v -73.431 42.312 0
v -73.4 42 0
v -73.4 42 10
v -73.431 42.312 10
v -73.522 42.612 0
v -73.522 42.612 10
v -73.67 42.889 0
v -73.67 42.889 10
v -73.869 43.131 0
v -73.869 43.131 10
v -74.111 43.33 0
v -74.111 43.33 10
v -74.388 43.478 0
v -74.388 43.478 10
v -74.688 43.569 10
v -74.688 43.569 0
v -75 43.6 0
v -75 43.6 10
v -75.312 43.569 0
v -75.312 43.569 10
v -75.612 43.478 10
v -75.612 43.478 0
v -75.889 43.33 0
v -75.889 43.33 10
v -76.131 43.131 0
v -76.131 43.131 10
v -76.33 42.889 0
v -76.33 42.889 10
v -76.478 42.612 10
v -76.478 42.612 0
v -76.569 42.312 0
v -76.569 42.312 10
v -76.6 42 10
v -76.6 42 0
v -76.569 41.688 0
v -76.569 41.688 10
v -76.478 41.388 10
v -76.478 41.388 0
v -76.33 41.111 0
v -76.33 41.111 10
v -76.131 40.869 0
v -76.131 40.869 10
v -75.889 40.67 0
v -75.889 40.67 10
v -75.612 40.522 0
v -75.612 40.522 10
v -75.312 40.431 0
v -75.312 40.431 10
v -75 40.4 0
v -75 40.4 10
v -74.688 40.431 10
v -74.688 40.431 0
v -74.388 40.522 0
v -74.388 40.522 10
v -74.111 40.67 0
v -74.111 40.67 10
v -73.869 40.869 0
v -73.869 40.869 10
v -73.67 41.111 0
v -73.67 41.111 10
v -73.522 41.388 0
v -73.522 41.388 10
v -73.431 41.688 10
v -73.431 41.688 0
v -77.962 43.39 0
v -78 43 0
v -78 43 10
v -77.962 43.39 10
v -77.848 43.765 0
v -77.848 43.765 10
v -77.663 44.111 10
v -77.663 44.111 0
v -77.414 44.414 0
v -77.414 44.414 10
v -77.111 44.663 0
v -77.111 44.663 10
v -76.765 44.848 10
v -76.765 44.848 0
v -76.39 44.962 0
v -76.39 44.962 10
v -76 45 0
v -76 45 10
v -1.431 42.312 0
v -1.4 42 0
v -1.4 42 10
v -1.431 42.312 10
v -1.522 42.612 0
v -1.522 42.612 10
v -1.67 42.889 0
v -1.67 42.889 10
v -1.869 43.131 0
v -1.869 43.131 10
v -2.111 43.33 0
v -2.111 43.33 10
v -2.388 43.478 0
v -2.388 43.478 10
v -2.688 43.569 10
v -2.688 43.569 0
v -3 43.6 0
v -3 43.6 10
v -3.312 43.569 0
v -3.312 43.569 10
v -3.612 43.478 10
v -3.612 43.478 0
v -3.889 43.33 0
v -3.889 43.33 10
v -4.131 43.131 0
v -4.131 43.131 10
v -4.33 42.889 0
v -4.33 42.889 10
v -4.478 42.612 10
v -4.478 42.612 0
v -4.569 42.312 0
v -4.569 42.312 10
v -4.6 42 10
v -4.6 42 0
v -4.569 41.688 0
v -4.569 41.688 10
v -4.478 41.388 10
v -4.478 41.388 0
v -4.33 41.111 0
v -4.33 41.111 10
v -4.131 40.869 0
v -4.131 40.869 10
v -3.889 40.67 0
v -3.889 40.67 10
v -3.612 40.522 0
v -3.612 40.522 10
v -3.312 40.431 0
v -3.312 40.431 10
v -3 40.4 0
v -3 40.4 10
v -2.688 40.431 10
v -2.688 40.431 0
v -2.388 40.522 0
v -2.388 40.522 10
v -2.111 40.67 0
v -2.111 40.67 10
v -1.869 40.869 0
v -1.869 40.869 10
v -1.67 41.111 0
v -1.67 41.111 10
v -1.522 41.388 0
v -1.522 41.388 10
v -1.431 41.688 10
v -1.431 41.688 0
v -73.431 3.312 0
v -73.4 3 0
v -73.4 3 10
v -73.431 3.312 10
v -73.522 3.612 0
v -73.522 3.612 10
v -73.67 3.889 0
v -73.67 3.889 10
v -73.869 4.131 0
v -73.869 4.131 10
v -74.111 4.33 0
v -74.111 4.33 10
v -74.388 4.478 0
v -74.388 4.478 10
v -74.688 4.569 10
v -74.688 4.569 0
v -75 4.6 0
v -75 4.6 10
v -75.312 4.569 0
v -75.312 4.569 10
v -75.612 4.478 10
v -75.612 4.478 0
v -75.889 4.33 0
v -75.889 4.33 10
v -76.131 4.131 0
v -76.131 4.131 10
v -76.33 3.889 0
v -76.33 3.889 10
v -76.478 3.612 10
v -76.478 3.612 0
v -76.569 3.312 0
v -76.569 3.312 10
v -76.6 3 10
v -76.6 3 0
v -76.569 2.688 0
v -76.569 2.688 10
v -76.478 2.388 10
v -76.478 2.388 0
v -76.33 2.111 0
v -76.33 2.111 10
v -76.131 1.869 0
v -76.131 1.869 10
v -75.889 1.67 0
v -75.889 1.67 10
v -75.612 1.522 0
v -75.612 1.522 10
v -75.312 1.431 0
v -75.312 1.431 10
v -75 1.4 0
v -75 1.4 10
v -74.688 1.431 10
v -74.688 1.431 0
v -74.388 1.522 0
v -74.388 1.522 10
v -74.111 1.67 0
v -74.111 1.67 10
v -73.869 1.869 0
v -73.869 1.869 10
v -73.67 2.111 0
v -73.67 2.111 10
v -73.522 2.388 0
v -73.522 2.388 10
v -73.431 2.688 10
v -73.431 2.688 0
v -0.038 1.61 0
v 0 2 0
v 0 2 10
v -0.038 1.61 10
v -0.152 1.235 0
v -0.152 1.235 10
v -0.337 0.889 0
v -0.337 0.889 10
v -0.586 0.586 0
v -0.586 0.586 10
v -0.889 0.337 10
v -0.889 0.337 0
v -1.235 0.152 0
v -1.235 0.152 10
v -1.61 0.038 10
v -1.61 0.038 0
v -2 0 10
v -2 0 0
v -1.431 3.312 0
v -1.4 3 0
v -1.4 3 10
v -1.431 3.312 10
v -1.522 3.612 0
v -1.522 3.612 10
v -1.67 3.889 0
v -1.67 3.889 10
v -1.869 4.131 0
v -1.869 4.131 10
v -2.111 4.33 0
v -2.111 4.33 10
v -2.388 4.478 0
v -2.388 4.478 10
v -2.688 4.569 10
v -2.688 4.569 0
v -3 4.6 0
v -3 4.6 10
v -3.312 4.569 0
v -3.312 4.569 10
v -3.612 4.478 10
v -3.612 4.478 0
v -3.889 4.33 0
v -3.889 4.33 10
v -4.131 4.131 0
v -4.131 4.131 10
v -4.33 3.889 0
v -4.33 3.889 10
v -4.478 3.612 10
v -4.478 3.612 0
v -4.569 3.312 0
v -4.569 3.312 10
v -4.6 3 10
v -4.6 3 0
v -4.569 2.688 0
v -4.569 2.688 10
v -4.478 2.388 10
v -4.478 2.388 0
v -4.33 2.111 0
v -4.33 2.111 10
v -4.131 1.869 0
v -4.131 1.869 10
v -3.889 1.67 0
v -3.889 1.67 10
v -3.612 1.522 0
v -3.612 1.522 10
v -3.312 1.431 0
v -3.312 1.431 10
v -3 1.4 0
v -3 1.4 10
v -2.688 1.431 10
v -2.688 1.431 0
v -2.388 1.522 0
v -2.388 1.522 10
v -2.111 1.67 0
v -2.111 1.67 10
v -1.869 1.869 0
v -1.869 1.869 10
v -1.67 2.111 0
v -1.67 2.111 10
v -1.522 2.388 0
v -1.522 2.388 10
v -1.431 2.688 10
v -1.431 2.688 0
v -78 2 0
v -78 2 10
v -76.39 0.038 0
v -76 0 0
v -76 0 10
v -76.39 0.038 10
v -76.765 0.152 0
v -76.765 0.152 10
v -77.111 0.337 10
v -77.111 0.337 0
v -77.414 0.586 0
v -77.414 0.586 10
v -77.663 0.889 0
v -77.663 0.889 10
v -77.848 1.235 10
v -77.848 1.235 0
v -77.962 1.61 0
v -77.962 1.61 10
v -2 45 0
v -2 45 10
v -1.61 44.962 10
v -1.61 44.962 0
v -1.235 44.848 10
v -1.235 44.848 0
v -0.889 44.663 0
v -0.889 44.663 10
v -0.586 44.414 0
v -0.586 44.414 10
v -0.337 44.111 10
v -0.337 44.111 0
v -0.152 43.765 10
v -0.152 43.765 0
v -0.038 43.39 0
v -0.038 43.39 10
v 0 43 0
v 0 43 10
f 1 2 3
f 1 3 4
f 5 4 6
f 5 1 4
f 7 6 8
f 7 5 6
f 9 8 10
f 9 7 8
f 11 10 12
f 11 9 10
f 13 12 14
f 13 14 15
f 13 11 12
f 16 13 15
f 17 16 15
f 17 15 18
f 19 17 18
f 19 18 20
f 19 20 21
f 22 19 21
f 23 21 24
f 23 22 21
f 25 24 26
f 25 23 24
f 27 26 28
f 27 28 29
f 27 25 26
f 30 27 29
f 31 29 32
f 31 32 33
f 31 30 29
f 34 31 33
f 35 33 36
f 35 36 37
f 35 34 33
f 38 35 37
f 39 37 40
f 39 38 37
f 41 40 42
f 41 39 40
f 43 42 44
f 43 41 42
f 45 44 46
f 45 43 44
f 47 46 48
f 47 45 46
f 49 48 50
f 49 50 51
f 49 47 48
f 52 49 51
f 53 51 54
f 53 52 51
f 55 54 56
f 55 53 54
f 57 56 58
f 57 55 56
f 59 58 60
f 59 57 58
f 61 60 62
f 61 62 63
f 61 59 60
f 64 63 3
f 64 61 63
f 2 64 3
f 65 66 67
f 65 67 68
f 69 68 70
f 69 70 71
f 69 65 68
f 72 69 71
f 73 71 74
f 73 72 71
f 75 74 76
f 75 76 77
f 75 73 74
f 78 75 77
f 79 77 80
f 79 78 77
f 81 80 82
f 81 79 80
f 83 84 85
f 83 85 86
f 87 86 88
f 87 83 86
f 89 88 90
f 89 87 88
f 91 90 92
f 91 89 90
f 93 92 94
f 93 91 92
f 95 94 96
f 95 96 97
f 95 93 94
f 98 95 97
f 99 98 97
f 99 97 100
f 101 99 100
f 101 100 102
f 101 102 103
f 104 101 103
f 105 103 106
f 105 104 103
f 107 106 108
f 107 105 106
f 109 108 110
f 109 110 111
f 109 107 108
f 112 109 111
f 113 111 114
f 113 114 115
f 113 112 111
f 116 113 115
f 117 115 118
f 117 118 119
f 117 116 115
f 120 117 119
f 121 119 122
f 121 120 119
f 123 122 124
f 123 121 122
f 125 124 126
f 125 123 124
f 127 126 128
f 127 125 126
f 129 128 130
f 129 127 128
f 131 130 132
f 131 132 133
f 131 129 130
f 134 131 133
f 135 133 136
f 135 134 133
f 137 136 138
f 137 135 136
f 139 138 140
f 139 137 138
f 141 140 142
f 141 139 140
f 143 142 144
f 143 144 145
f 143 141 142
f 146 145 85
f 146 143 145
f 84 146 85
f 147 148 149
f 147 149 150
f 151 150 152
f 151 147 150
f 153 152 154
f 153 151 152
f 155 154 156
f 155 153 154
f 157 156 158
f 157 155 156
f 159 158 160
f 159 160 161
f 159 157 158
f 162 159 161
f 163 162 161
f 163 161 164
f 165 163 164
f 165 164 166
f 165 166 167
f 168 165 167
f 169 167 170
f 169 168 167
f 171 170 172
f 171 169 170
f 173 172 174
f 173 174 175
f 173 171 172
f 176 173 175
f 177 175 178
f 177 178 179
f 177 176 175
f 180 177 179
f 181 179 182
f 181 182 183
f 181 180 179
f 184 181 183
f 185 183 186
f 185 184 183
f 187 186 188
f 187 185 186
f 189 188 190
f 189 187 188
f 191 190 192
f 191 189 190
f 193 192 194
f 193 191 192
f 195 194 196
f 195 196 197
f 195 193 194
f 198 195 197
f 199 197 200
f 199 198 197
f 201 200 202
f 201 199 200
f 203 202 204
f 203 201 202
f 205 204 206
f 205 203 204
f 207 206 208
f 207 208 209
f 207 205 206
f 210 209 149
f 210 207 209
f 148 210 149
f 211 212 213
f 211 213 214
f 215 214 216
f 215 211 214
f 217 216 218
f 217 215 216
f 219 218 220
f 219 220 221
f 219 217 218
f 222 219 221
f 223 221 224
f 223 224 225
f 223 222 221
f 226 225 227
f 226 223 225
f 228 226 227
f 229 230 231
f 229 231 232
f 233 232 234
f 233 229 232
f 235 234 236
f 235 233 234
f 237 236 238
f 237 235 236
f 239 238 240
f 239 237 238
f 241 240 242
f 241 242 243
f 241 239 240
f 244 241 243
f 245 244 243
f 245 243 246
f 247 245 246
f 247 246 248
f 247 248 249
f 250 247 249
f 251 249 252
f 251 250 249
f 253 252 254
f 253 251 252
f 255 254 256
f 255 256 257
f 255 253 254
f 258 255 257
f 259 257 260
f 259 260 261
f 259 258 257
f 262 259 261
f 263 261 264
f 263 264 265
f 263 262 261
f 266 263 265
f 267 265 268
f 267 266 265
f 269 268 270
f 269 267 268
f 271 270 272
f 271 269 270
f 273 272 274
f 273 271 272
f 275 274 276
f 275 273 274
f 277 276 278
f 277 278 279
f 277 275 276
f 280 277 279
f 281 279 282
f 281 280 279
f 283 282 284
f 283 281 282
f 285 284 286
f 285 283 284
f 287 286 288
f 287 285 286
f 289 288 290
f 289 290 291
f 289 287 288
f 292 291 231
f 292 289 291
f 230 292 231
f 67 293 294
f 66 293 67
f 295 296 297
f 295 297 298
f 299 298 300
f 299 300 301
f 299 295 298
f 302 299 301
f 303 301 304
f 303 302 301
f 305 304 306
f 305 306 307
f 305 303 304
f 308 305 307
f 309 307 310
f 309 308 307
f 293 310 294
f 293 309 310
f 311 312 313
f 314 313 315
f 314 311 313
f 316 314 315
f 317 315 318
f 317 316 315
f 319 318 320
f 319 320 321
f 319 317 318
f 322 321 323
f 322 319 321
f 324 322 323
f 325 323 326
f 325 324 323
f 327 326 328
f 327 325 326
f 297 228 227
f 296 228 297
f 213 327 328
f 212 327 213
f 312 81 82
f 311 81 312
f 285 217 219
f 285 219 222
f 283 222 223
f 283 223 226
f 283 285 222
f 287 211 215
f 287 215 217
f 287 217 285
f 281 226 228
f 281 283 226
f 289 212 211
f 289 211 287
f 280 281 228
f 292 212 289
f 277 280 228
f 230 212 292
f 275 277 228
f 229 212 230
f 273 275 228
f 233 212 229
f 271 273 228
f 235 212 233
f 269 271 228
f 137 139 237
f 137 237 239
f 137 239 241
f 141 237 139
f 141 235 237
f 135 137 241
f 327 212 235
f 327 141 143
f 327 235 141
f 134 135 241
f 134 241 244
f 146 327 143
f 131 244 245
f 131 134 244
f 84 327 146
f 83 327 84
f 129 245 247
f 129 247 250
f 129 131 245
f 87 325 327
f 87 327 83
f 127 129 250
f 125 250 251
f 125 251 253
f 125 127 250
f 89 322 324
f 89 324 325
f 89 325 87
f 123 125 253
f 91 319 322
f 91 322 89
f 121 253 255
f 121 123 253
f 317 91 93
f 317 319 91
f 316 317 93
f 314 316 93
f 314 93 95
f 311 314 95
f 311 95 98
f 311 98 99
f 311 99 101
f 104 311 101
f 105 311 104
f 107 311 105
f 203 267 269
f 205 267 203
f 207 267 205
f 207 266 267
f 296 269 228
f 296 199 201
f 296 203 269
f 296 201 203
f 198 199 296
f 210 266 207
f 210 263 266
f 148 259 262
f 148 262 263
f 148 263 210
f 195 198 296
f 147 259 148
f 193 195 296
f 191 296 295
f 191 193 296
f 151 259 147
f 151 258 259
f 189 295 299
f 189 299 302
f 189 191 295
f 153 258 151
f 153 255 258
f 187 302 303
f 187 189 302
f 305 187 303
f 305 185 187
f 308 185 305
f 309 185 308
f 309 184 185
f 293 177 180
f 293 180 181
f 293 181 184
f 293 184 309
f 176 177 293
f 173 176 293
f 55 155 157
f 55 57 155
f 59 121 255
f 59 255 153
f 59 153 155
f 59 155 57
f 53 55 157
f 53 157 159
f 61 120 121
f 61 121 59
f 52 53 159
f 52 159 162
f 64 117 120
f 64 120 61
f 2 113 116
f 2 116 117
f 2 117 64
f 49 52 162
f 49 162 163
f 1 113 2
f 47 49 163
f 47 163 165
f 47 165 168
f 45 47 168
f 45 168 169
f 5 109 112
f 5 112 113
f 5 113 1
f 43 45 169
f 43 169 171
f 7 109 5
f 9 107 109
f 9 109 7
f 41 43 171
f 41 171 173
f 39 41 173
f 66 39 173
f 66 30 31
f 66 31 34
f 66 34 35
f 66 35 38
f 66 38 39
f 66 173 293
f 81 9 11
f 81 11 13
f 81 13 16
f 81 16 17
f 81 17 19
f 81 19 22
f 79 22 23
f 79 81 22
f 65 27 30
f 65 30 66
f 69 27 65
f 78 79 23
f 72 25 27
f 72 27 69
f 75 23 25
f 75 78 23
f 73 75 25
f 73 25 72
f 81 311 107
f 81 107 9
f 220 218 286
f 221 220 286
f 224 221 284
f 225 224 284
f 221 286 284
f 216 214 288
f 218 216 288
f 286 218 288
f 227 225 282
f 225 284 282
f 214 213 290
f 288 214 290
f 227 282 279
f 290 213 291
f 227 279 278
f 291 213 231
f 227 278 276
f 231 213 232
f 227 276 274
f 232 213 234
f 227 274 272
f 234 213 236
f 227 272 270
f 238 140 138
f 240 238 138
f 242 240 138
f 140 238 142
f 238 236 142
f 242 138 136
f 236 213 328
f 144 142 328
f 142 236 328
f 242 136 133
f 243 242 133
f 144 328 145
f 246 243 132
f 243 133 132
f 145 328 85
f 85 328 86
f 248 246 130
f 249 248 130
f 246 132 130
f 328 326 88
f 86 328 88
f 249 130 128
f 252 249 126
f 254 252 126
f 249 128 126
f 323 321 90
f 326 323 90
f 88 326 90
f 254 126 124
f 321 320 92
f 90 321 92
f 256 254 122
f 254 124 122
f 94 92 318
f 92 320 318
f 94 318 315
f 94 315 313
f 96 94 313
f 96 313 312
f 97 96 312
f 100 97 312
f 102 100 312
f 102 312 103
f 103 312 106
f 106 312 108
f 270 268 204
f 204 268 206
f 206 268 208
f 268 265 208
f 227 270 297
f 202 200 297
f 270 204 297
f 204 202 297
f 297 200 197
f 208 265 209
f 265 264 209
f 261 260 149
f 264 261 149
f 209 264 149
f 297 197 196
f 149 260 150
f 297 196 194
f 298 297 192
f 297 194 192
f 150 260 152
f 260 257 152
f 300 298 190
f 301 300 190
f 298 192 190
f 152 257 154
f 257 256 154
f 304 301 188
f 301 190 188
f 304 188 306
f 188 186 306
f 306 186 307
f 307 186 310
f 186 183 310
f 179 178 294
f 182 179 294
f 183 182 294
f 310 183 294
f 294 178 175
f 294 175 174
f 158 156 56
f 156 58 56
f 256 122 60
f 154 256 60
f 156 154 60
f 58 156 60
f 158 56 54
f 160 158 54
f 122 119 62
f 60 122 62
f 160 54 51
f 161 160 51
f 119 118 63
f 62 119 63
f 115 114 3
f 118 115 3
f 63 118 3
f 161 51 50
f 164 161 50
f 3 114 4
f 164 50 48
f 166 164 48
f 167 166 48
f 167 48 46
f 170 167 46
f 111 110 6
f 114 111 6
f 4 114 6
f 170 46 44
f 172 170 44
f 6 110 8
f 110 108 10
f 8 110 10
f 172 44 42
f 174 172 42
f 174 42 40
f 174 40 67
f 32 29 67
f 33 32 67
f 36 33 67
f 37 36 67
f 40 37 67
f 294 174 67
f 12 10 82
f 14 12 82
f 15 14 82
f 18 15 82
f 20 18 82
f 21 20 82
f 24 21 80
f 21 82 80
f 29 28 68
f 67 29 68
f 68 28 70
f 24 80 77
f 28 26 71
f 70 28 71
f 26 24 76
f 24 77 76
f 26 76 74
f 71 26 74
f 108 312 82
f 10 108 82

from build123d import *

# Parameters (mm, degrees)
SKETCH1_R           = 1.6
BOSS_EXTRUDE2_DEPTH = 10


with BuildPart() as part:
    # Sketch1 → Boss-Extrude2 (new body)
    with BuildSketch(Plane.XY):
        with BuildLine():
            Line((-78, 42), (-78, 43))
            ThreePointArc((-78, 43), (-77.414213562, 44.414213562), (-76, 45))
            Line((-76, 45), (-75, 45))
            Line((-75, 45), (-3, 45))
            Line((-3, 45), (-2, 45))
            ThreePointArc((-2, 45), (-0.585786438, 44.414213562), (0, 43))
            Line((0, 43), (0, 42))
            Line((0, 42), (0, 3))
            Line((0, 3), (0, 2))
            ThreePointArc((0, 2), (-0.585786438, 0.585786438), (-2, 0))
            Line((-2, 0), (-3, 0))
            Line((-3, 0), (-75, 0))
            Line((-75, 0), (-76, 0))
            ThreePointArc((-76, 0), (-77.414213562, 0.585786438), (-78, 2))
            Line((-78, 2), (-78, 3))
            Line((-78, 3), (-78, 42))
        make_face()
        with Locations((-75, 3)):
            Circle(SKETCH1_R, mode=Mode.SUBTRACT)
        with Locations((-3, 3)):
            Circle(SKETCH1_R, mode=Mode.SUBTRACT)
        with Locations((-3, 42)):
            Circle(SKETCH1_R, mode=Mode.SUBTRACT)
        with Locations((-75, 42)):
            Circle(SKETCH1_R, mode=Mode.SUBTRACT)
    extrude(amount=BOSS_EXTRUDE2_DEPTH)


solid = part.part
